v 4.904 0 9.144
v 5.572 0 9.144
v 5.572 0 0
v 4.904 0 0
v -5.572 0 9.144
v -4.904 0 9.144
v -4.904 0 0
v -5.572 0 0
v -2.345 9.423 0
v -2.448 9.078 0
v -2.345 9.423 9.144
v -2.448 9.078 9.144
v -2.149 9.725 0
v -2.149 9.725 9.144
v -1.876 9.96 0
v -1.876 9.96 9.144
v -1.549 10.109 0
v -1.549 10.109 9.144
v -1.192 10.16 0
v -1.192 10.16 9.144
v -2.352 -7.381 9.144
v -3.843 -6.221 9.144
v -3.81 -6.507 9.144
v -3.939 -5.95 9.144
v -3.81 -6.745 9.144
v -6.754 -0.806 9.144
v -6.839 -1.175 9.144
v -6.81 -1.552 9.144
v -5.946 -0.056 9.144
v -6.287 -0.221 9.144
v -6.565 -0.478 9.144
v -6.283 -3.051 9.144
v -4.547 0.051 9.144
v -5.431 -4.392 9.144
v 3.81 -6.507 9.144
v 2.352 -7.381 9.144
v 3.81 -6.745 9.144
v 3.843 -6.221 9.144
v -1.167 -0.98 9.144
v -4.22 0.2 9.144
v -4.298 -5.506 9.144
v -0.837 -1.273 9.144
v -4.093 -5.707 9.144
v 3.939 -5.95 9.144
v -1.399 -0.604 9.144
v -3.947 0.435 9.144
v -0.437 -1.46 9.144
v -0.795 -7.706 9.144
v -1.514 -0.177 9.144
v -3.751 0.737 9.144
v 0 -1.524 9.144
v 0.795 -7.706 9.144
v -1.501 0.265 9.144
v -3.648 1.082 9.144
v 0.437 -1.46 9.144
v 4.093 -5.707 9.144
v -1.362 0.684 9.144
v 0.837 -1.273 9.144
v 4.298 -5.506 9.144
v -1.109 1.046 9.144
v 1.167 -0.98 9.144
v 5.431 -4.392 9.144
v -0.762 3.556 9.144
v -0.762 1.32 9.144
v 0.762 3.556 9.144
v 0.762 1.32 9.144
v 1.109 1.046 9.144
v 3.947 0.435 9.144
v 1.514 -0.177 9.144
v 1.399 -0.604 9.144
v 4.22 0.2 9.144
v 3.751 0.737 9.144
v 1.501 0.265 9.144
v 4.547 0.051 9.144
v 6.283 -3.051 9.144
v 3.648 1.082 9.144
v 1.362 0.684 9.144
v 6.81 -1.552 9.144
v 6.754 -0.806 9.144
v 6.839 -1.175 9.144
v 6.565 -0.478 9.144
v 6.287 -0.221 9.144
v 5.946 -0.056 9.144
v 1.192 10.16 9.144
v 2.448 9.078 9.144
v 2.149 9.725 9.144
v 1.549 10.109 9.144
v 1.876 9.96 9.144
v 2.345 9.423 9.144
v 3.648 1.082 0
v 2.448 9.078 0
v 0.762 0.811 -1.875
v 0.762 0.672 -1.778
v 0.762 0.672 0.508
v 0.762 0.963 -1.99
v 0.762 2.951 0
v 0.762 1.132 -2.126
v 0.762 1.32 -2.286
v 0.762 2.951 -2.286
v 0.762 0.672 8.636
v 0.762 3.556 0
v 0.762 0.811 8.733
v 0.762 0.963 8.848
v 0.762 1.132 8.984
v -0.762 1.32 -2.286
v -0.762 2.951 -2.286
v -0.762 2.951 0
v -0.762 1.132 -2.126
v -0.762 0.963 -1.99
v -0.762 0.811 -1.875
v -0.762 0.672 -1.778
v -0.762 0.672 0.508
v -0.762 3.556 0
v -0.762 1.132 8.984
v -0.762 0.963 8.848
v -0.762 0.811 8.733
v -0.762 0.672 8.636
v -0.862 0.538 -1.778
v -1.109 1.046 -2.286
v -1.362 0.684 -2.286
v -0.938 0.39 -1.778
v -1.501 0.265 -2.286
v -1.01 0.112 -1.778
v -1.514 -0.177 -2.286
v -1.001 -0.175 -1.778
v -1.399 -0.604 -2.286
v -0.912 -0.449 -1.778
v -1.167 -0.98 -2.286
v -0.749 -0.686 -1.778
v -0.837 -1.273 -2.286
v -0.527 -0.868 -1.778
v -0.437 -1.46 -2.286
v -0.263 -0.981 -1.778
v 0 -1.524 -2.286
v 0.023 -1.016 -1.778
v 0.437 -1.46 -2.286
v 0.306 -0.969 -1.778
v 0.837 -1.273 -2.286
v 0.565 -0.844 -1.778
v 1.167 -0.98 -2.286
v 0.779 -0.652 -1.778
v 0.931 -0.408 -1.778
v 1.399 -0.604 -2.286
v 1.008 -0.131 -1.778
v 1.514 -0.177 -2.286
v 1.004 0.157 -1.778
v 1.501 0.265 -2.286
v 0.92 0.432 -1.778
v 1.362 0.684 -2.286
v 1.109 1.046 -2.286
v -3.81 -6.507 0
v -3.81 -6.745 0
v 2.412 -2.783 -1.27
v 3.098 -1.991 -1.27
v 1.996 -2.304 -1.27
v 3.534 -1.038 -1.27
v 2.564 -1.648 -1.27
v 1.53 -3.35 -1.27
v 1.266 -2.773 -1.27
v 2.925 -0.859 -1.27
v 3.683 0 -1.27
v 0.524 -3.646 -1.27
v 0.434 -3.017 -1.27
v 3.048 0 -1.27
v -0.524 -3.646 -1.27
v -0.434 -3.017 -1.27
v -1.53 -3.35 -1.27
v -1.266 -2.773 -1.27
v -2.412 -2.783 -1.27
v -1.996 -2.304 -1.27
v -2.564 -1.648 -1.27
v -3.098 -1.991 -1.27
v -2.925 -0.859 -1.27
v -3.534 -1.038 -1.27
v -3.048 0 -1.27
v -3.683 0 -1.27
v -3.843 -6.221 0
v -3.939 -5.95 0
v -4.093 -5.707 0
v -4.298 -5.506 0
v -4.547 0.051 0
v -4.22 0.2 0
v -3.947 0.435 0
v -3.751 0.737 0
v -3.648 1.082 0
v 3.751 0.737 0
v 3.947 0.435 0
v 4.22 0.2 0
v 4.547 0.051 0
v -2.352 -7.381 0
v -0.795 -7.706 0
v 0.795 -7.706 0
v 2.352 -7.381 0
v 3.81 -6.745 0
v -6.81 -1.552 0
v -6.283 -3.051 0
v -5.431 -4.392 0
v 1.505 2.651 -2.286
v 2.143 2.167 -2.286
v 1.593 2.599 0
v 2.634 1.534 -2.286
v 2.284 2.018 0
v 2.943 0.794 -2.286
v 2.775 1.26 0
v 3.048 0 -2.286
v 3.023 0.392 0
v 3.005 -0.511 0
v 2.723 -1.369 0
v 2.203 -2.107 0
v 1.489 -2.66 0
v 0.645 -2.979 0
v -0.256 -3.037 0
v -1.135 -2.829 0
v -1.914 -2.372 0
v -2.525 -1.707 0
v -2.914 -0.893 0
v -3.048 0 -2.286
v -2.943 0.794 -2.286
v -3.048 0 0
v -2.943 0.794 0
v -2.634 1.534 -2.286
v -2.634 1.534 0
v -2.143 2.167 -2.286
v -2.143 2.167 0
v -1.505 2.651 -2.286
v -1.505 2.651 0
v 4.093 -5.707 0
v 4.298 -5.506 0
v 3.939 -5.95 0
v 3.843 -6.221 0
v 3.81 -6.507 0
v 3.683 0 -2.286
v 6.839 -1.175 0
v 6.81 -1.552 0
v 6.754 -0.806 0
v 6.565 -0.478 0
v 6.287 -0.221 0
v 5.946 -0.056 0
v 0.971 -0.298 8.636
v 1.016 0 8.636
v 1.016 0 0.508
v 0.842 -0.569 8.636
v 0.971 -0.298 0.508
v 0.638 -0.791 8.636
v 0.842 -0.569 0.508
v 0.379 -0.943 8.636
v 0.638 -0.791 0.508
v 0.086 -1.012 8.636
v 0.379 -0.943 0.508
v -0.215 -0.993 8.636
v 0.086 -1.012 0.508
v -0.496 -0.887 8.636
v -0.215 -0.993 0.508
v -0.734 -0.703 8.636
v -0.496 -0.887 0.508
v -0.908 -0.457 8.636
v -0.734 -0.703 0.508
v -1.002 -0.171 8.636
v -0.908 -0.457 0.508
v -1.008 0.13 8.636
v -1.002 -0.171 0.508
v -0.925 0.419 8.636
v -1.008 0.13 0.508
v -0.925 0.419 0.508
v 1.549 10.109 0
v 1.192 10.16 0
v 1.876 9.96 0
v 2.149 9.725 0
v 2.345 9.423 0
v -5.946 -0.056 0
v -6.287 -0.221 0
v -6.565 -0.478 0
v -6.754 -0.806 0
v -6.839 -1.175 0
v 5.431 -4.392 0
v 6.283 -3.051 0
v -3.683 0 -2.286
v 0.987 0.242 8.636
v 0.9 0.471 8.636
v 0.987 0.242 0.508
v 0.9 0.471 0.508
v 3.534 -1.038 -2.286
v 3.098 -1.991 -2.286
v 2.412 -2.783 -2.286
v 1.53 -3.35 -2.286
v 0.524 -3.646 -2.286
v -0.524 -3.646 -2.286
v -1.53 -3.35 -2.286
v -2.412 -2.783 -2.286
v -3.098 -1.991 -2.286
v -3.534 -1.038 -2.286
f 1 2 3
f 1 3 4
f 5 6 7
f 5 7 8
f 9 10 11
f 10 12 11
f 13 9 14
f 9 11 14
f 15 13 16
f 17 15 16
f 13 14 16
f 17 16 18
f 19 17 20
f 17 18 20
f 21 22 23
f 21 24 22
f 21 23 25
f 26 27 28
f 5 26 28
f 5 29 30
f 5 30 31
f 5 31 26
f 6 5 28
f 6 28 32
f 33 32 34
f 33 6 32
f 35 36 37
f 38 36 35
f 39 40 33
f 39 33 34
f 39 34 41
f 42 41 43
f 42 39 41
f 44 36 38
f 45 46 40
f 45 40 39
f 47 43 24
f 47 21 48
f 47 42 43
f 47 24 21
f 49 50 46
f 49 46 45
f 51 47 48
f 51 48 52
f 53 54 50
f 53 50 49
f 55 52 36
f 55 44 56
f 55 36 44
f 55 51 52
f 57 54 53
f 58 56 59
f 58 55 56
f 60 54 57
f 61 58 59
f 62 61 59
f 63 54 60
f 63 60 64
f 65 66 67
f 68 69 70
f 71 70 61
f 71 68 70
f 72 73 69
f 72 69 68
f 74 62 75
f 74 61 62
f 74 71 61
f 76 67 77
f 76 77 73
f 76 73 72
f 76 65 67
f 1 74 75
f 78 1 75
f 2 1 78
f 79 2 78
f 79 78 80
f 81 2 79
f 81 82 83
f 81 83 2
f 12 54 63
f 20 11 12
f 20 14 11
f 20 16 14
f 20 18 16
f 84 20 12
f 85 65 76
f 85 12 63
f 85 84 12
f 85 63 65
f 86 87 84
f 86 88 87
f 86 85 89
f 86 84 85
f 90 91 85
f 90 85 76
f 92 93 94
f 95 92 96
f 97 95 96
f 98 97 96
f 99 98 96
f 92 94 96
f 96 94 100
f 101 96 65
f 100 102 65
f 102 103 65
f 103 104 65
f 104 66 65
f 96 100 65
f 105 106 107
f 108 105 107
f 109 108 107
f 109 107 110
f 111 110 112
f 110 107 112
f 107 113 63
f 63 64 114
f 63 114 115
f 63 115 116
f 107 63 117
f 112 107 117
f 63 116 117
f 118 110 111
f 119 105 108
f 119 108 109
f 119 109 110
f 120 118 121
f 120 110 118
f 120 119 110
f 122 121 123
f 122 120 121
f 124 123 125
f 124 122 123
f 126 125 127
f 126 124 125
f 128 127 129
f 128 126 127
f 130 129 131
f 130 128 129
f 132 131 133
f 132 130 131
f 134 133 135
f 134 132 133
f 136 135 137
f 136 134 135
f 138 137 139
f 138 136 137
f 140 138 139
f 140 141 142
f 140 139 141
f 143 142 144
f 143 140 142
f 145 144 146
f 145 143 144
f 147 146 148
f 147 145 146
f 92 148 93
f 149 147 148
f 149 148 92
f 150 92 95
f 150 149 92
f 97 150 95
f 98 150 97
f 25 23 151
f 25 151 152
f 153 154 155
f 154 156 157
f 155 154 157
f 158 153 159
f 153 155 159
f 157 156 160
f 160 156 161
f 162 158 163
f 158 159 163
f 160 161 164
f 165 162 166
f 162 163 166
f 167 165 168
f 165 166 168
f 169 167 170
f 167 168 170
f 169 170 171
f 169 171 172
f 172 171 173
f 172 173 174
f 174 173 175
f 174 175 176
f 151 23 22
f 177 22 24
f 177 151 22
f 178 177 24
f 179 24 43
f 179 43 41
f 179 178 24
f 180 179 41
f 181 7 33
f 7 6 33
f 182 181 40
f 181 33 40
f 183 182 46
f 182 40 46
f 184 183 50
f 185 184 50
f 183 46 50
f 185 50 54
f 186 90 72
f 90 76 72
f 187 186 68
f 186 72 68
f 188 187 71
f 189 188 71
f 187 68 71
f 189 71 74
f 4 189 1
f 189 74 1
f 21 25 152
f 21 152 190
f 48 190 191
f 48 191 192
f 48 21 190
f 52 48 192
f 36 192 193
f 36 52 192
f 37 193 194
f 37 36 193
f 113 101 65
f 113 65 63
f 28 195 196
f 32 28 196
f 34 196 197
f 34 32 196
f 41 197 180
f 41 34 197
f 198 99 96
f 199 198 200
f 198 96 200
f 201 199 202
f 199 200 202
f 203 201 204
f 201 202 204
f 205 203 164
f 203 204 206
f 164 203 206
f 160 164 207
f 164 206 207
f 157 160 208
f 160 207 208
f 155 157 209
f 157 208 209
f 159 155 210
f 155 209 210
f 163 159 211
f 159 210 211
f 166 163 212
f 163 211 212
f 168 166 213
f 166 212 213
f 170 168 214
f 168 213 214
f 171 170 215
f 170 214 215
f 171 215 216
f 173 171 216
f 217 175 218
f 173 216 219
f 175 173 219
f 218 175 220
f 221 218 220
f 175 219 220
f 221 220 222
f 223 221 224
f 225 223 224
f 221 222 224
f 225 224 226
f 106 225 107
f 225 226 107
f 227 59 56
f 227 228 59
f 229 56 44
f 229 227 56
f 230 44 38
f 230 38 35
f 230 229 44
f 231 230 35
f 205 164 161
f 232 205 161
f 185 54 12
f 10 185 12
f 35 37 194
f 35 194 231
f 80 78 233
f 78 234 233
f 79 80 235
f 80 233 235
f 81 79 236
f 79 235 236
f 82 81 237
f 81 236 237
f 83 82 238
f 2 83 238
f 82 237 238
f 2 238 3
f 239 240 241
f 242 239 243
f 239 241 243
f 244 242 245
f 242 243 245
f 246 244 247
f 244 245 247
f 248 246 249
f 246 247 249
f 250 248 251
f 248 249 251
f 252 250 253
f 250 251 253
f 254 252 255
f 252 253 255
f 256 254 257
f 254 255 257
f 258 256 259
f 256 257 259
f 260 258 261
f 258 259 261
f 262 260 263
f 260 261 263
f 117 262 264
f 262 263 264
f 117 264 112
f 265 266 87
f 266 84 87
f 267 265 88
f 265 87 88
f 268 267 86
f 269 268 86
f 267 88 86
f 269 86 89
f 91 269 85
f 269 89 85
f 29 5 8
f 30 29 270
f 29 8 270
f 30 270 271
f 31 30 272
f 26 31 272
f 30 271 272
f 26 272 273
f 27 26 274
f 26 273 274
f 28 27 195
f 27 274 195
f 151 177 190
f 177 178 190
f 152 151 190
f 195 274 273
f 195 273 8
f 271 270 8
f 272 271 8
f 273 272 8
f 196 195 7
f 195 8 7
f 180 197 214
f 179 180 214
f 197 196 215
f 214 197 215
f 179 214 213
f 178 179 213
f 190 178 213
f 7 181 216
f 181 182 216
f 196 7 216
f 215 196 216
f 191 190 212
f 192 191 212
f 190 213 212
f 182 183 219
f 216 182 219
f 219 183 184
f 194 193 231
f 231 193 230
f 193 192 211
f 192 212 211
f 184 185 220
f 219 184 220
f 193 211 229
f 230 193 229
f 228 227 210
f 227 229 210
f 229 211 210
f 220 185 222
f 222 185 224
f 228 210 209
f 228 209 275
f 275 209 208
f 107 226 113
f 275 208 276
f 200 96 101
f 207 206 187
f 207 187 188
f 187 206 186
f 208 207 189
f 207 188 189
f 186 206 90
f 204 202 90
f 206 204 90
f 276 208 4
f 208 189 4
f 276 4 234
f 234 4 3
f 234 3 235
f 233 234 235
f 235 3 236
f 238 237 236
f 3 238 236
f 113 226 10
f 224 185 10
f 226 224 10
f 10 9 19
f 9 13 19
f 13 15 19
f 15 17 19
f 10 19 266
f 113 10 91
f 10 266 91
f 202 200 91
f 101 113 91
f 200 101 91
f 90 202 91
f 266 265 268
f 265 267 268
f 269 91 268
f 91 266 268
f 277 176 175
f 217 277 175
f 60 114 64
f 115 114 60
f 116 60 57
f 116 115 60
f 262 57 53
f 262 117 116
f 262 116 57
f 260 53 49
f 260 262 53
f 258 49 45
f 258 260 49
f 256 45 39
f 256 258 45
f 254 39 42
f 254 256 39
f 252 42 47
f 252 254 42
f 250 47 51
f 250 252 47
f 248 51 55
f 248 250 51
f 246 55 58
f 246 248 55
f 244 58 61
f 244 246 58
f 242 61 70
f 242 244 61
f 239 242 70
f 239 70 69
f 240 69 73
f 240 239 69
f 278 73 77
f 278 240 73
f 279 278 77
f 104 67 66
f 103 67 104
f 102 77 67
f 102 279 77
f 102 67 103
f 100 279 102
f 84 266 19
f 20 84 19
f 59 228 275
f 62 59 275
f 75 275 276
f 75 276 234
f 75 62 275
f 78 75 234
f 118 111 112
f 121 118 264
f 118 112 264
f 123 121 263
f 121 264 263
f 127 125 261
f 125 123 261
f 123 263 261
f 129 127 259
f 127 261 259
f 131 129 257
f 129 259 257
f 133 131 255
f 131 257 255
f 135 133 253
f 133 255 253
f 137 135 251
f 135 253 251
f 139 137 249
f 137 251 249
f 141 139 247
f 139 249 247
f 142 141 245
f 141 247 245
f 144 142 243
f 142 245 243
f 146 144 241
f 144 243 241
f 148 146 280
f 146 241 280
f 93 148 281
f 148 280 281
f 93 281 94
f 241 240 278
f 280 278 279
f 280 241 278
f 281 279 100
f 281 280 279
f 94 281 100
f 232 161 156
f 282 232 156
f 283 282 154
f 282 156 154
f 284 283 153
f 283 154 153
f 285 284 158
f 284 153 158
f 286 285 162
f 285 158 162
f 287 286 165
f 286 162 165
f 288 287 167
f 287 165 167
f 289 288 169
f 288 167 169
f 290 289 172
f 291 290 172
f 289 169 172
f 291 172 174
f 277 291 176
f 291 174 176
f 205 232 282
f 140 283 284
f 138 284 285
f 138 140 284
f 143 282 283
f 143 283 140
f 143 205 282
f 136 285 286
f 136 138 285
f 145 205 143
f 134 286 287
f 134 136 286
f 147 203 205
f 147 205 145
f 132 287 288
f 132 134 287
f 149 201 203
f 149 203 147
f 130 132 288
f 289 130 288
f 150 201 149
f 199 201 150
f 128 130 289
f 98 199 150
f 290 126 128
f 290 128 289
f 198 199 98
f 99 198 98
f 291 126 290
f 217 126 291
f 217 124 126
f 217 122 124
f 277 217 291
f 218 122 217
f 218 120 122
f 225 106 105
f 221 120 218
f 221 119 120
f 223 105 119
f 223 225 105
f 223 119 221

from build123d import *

# Parameters (mm, degrees)
BOSS_EXTRUDE2_DEPTH  = 9.144
CUT_EXTRUDE1_DEPTH   = 0.508
SKETCH4_W            = 1.524
SKETCH4_H            = 3.556
CUT_EXTRUDE2_DEPTH   = 10.144
BOSS_EXTRUDE8_DEPTH  = 9.144
BOSS_EXTRUDE10_DEPTH = 9.144
FILLET2_R            = 1.27
CUT_EXTRUDE4_DEPTH   = 9.144
FILLET4_R            = 1.27
BOSS_EXTRUDE11_DEPTH = 1.27
BOSS_EXTRUDE12_DEPTH = 1.016
BOSS_EXTRUDE13_START = -0.508
BOSS_EXTRUDE13_DEPTH = 0.508
BOSS_EXTRUDE14_DEPTH = 1.27
BOSS_EXTRUDE15_DEPTH = 1.016


with BuildPart() as part:
    # Sketch2 → Boss-Extrude2 (new body)
    with BuildSketch(Plane.XY):
        with BuildLine():
            ThreePointArc((-3.81, 0), (0, -3.81), (3.81, 0))
            Line((3.81, 0), (3.81, 8.636))
            ThreePointArc((3.81, 8.636), (3.363630735, 9.713630735), (2.286, 10.16))
            Line((2.286, 10.16), (-2.286, 10.16))
            ThreePointArc((-2.286, 10.16), (-3.363630735, 9.713630735), (-3.81, 8.636))
            Line((-3.81, 8.636), (-3.81, 0))
        make_face()
        with BuildLine():
            Line((-0.762, 0), (1.016, 0))
            ThreePointArc((1.016, 0), (-0.359210245, -0.950380976), (-0.762, 0.672020833))
            Line((-0.762, 0.672020833), (-0.762, 0))
        make_face(mode=Mode.SUBTRACT)
    extrude(amount=BOSS_EXTRUDE2_DEPTH)

    # Sketch3 → Cut-Extrude1 (cut)
    with BuildSketch(Plane.XY.offset(9.144)):
        with BuildLine():
            Line((-0.762, 0), (1.016, 0))
            ThreePointArc((1.016, 0), (0.950380976, 0.359210245), (0.762, 0.672020833))
            Line((0.762, 0.672020833), (0.762, 3.556))
            Line((0.762, 3.556), (-0.762, 3.556))
            Line((-0.762, 3.556), (-0.762, 0))
        make_face()
    extrude(amount=-CUT_EXTRUDE1_DEPTH, mode=Mode.SUBTRACT)

    # Sketch4 → Cut-Extrude2 (cut, through all)
    with BuildSketch(Plane(origin=(0, 0, 0), x_dir=(-1, 0, 0), z_dir=(0, 0, -1))):
        with Locations((0, 1.778)):
            Rectangle(SKETCH4_W, SKETCH4_H)
    extrude(amount=-CUT_EXTRUDE2_DEPTH, mode=Mode.SUBTRACT)

    # Sketch7 → Cut-Revolve1 (revolve, cut)
    with BuildSketch(Plane(origin=(0, 0, 0), x_dir=(1, 0, 0), z_dir=(0, 1, 0))):
        Polygon((0, 0), (0, -9.144), (1.524, -9.144), (1.016, -8.636), (1.016, -0.508), (1.524, 0), align=None)
    revolve(axis=Axis((0, 0, 0), (0, 0, 1)), mode=Mode.SUBTRACT)

    # Sketch10 → Boss-Extrude8 (add)
    with BuildSketch(Plane.XY.offset(9.144)):
        with BuildLine():
            Line((-3.81, 0), (-6.985, 0))
            ThreePointArc((-6.985, 0), (0, -6.985), (6.985, 0))
            Line((6.985, 0), (3.81, 0))
            ThreePointArc((3.81, 0), (0, -3.81), (-3.81, 0))
        make_face()
    extrude(amount=-BOSS_EXTRUDE8_DEPTH)

    # Sketch14 → Boss-Extrude10 (add)
    with BuildSketch(Plane.XY.offset(9.144)):
        with BuildLine():
            ThreePointArc((3.81, -5.85441073), (0, -6.985), (-3.81, -5.85441073))
            Line((-3.81, -5.85441073), (-3.81, -6.745362036))
            ThreePointArc((-3.81, -6.745362036), (0, -7.747), (3.81, -6.745362036))
            Line((3.81, -6.745362036), (3.81, -5.85441073))
        make_face()
    extrude(amount=-BOSS_EXTRUDE10_DEPTH)

    # Fillet2
    fillet2_edges = [part.edges().sort_by_distance(p)[0] for p in [
        (6.985, 0, 4.572),
        (-6.985, 0, 4.572),
    ]]
    fillet(fillet2_edges, radius=FILLET2_R)

    # Sketch16 → Cut-Extrude4 (cut)
    with BuildSketch(Plane.XY.offset(9.144)):
        with BuildLine():
            Line((-3.81, 0), (-2.286, 10.16))
            ThreePointArc((-2.286, 10.16), (-3.363630735, 9.713630735), (-3.81, 8.636))
            Line((-3.81, 8.636), (-3.81, 0))
        make_face()
        with BuildLine():
            Line((2.286, 10.16), (3.81, 0))
            Line((3.81, 0), (3.81, 8.636))
            ThreePointArc((3.81, 8.636), (3.363630735, 9.713630735), (2.286, 10.16))
        make_face()
    extrude(amount=-CUT_EXTRUDE4_DEPTH, mode=Mode.SUBTRACT)

    # Fillet4
    fillet4_edges = [part.edges().sort_by_distance(p)[0] for p in [
        (-3.81, -5.85441073, 4.572),
        (3.81, -5.85441073, 4.572),
        (-3.81, 0, 4.572),
        (-2.286, 10.16, 4.572),
        (2.286, 10.16, 4.572),
        (3.81, 0, 4.572),
    ]]
    fillet(fillet4_edges, radius=FILLET4_R)

    # Sketch17 → Boss-Extrude11 (add)
    with BuildSketch(Plane(origin=(0, 0, 0), x_dir=(-1, 0, 0), z_dir=(0, 0, -1))):
        with BuildLine():
            Line((0.762, 2.95121331), (0.762, 1.319822715))
            ThreePointArc((0.762, 1.319822715), (0, -1.524), (-0.762, 1.319822715))
            Line((-0.762, 1.319822715), (-0.762, 2.95121331))
            ThreePointArc((-0.762, 2.95121331), (-1.866511184, -2.409655577), (3.048, 0))
            ThreePointArc((3.048, 0), (2.409655577, 1.866511184), (0.762, 2.95121331))
        make_face()
    extrude(amount=BOSS_EXTRUDE11_DEPTH)

    # Sketch18 → Boss-Extrude12 (add)
    with BuildSketch(Plane(origin=(0, 0, -1.27), x_dir=(-1, 0, 0), z_dir=(0, 0, -1))):
        with BuildLine():
            Line((-1.524, 0), (-3.048, 0))
            ThreePointArc((-3.048, 0), (0, -3.048), (3.048, 0))
            Line((3.048, 0), (1.524, 0))
            ThreePointArc((1.524, 0), (0, -1.524), (-1.524, 0))
        make_face()
        with BuildLine():
            Line((-3.048, 0), (-3.683, 0))
            ThreePointArc((-3.683, 0), (0, -3.683), (3.683, 0))
            Line((3.683, 0), (3.048, 0))
            ThreePointArc((3.048, 0), (0, -3.048), (-3.048, 0))
        make_face()
    extrude(amount=BOSS_EXTRUDE12_DEPTH)

    # Sketch20 → Boss-Extrude13 (add)
    with BuildSketch(Plane(origin=(0, 0, 0), x_dir=(-1, 0, 0), z_dir=(0, 0, -1)).offset(BOSS_EXTRUDE13_START)):
        with BuildLine():
            Line((0.762, 1.319822715), (0.762, 0.672020833))
            ThreePointArc((0.762, 0.672020833), (0, -1.016), (-0.762, 0.672020833))
            Line((-0.762, 0.672020833), (-0.762, 1.319822715))
            ThreePointArc((-0.762, 1.319822715), (0, -1.524), (0.762, 1.319822715))
        make_face()
    extrude(amount=BOSS_EXTRUDE13_DEPTH)

    # Sketch21 → Boss-Extrude14 (add)
    with BuildSketch(Plane(origin=(0, 0, 0), x_dir=(-1, 0, 0), z_dir=(0, 0, -1))):
        with BuildLine():
            Line((0.762, 1.319822715), (0.762, 0.672020833))
            ThreePointArc((0.762, 0.672020833), (0, -1.016), (-0.762, 0.672020833))
            Line((-0.762, 0.672020833), (-0.762, 1.319822715))
            ThreePointArc((-0.762, 1.319822715), (0, -1.524), (0.762, 1.319822715))
        make_face()
    extrude(amount=BOSS_EXTRUDE14_DEPTH)

    # Sketch22 → Boss-Extrude15 (add)
    with BuildSketch(Plane(origin=(0, 0, -1.27), x_dir=(-1, 0, 0), z_dir=(0, 0, -1))):
        with BuildLine():
            Line((0.762, 2.95121331), (0.762, 0.672020833))
            ThreePointArc((0.762, 0.672020833), (0, -1.016), (-0.762, 0.672020833))
            Line((-0.762, 0.672020833), (-0.762, 2.95121331))
            ThreePointArc((-0.762, 2.95121331), (-2.409655577, 1.866511184), (-3.048, 0))
            Line((-3.048, 0), (-1.524, 0))
            ThreePointArc((-1.524, 0), (0, -1.524), (1.524, 0))
            Line((1.524, 0), (3.048, 0))
            ThreePointArc((3.048, 0), (2.409655577, 1.866511184), (0.762, 2.95121331))
        make_face()
    extrude(amount=BOSS_EXTRUDE15_DEPTH)

    # Sketch23 → Cut-Revolve2 (revolve, cut)
    with BuildSketch(Plane(origin=(0, 0, 0), x_dir=(1, 0, 0), z_dir=(0, 1, 0))):
        Polygon((0, 2.286), (0, 0), (0.762, 0), (0.762, 1.524), (1.524, 2.286), align=None)
    revolve(axis=Axis((0, 0, -2.286), (0, 0, 1)), mode=Mode.SUBTRACT)


solid = part.part
